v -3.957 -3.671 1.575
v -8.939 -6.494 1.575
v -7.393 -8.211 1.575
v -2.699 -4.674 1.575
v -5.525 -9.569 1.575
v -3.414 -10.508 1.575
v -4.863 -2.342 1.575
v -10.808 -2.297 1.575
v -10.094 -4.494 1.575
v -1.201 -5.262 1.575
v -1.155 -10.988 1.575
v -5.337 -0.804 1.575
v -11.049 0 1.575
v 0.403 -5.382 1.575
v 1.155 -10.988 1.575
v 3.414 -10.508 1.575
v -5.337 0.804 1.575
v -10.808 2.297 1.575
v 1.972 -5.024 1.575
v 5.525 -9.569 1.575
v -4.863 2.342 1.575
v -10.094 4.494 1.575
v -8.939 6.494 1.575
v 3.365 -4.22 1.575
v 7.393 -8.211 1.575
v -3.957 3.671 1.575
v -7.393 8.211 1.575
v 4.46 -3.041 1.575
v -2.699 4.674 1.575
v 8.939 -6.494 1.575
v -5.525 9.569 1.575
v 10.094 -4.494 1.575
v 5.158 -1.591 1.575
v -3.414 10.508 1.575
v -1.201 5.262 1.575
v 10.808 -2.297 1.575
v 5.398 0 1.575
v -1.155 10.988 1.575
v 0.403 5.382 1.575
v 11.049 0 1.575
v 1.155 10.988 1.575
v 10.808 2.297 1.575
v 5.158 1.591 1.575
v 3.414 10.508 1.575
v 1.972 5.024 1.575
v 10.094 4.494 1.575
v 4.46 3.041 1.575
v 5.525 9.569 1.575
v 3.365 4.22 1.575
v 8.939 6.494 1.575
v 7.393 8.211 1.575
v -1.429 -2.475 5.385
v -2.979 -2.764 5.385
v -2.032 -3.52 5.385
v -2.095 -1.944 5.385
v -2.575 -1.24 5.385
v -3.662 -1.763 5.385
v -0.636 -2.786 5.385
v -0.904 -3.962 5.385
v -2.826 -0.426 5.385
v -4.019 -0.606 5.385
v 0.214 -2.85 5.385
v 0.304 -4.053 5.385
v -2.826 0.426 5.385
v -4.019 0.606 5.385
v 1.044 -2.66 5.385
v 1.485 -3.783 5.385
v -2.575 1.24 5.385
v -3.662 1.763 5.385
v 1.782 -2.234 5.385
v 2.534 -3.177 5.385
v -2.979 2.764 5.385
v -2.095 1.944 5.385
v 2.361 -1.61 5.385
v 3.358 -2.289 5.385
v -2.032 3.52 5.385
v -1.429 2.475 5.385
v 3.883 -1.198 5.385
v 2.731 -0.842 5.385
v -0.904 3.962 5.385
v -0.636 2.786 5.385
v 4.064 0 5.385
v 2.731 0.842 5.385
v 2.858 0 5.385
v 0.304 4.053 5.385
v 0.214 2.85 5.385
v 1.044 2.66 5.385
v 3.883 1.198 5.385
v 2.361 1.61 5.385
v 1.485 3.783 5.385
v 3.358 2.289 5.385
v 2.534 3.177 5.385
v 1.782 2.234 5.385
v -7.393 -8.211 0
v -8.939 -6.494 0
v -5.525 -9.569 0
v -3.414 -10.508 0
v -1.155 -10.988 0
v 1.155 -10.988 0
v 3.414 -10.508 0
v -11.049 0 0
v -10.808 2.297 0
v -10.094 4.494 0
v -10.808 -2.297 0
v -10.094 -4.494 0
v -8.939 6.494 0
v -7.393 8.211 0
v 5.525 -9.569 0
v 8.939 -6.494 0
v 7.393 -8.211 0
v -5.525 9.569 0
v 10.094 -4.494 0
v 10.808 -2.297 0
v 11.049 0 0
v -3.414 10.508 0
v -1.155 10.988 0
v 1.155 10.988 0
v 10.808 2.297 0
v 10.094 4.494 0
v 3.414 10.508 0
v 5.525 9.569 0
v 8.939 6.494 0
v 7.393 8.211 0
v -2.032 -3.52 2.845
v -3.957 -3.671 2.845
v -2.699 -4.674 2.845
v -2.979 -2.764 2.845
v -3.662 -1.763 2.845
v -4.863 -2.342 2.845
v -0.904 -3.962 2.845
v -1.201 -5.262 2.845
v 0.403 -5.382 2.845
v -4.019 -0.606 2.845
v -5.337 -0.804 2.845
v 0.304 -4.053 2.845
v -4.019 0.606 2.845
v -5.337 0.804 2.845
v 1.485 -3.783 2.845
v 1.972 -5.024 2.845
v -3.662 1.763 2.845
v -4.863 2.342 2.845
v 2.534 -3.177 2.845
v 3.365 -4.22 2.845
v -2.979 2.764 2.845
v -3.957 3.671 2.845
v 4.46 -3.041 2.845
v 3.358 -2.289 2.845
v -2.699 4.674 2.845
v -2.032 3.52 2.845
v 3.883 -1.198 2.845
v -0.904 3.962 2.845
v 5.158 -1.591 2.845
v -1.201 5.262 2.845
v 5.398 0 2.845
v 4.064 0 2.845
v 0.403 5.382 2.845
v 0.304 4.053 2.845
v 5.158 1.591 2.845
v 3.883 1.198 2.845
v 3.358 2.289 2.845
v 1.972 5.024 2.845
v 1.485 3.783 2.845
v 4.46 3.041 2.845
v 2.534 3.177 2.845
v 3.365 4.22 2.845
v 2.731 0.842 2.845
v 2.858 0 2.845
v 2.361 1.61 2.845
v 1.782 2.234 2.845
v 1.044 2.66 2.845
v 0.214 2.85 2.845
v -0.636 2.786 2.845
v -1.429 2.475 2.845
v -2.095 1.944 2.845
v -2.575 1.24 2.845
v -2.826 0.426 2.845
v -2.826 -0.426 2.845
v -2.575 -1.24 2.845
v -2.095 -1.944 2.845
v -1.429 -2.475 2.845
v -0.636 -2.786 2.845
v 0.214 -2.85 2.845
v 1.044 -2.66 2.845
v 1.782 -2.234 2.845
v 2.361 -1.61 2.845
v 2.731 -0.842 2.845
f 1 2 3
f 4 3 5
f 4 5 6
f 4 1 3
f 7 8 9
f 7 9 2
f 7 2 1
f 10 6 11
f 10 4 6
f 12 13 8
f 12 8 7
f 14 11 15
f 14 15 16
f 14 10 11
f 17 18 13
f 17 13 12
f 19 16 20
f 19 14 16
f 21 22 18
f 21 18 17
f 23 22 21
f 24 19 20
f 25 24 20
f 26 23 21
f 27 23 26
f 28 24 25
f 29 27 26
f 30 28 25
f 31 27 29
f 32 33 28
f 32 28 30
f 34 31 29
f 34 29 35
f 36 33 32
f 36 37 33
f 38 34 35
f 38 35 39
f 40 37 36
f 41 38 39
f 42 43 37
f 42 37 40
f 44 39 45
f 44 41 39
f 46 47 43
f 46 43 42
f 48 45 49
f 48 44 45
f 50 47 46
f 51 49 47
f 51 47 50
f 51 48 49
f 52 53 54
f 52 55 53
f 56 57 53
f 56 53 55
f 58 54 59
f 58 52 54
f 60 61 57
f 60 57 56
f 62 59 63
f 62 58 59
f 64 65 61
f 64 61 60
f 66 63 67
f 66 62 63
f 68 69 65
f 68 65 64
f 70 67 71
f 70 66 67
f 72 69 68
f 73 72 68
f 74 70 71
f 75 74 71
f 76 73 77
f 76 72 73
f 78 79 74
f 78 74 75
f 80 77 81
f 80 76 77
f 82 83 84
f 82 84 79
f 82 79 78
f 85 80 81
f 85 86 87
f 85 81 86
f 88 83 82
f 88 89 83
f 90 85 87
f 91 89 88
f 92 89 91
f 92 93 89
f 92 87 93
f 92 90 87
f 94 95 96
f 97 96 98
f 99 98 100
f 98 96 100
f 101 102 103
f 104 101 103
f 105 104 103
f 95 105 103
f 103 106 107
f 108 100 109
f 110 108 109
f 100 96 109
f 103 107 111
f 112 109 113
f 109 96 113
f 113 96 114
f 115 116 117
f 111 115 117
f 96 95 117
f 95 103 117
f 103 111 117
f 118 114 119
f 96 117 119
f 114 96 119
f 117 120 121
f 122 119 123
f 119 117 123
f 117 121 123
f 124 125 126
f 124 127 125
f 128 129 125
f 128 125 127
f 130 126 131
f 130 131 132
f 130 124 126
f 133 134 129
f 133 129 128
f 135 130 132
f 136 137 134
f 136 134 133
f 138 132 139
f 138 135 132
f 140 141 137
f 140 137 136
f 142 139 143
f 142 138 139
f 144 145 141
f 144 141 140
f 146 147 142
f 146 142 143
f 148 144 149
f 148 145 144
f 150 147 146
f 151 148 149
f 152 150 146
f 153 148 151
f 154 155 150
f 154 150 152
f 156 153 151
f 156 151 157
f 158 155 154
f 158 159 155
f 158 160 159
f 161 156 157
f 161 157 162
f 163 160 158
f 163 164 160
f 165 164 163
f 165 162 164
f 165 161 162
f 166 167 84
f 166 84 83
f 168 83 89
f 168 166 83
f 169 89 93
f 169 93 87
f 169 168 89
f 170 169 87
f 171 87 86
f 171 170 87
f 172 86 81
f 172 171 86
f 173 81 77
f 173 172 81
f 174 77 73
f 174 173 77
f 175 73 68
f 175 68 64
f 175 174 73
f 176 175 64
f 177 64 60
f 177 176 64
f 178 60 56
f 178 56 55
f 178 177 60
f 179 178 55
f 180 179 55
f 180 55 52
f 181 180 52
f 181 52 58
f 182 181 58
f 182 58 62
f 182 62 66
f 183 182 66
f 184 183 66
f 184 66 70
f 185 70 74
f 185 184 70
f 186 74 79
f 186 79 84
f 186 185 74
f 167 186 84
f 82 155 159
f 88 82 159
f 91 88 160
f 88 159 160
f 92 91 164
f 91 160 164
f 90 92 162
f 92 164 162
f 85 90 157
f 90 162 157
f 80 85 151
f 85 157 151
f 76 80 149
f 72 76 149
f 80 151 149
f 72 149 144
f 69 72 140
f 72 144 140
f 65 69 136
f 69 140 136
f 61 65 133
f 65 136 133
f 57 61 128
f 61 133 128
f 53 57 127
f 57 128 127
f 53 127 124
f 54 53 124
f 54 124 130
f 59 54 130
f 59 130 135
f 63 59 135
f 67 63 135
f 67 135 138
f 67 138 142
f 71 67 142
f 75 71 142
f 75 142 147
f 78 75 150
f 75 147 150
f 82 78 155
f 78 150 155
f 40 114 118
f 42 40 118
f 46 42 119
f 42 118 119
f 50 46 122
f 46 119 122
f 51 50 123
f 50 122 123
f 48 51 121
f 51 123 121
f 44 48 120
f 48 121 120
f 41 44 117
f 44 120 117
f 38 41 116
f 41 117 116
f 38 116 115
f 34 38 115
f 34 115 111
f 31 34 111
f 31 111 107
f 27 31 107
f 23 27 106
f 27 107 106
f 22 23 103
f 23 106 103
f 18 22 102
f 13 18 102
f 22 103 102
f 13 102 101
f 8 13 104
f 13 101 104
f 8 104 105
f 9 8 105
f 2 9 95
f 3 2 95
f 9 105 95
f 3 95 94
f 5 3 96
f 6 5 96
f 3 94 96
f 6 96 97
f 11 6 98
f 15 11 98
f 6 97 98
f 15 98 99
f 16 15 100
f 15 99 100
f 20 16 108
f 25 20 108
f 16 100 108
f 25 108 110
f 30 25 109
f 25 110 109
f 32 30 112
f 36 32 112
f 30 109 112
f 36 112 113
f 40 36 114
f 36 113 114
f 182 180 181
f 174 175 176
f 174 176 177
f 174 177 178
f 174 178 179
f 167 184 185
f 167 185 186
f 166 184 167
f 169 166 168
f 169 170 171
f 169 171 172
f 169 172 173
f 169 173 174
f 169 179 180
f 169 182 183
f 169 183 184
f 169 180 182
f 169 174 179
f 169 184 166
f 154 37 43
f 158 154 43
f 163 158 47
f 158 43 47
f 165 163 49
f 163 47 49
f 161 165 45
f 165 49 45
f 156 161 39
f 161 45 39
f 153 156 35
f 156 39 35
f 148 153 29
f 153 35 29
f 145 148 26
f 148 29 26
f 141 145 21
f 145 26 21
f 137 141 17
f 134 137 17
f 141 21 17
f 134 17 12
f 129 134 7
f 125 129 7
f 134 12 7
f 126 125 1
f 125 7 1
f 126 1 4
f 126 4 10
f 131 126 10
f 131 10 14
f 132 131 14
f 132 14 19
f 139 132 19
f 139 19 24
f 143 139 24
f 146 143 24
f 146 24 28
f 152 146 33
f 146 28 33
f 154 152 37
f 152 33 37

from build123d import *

# Parameters (mm, degrees)
F0_R     = 11.049
F1_DEPTH = 1.5748
F2_R     = 5.3975
F3_DEPTH = 1.27
F4_R     = 4.064
F4_R_2   = 2.8575
F5_DEPTH = 2.54


with BuildPart() as f1:
    # F0 (on Top) → F1 (new body)
    with BuildSketch(Plane.XY):
        Circle(F0_R)
    extrude(amount=F1_DEPTH)

    # F2 (on face) → F3 (join)
    with BuildSketch(Plane.XY.offset(1.5748)):
        Circle(F2_R)
    extrude(amount=F3_DEPTH)

    # F4 (on face) → F5 (join)
    with BuildSketch(Plane.XY.offset(2.8448)):
        Circle(F4_R)
        Circle(F4_R_2, mode=Mode.SUBTRACT)
    extrude(amount=F5_DEPTH)


solid = f1.part
